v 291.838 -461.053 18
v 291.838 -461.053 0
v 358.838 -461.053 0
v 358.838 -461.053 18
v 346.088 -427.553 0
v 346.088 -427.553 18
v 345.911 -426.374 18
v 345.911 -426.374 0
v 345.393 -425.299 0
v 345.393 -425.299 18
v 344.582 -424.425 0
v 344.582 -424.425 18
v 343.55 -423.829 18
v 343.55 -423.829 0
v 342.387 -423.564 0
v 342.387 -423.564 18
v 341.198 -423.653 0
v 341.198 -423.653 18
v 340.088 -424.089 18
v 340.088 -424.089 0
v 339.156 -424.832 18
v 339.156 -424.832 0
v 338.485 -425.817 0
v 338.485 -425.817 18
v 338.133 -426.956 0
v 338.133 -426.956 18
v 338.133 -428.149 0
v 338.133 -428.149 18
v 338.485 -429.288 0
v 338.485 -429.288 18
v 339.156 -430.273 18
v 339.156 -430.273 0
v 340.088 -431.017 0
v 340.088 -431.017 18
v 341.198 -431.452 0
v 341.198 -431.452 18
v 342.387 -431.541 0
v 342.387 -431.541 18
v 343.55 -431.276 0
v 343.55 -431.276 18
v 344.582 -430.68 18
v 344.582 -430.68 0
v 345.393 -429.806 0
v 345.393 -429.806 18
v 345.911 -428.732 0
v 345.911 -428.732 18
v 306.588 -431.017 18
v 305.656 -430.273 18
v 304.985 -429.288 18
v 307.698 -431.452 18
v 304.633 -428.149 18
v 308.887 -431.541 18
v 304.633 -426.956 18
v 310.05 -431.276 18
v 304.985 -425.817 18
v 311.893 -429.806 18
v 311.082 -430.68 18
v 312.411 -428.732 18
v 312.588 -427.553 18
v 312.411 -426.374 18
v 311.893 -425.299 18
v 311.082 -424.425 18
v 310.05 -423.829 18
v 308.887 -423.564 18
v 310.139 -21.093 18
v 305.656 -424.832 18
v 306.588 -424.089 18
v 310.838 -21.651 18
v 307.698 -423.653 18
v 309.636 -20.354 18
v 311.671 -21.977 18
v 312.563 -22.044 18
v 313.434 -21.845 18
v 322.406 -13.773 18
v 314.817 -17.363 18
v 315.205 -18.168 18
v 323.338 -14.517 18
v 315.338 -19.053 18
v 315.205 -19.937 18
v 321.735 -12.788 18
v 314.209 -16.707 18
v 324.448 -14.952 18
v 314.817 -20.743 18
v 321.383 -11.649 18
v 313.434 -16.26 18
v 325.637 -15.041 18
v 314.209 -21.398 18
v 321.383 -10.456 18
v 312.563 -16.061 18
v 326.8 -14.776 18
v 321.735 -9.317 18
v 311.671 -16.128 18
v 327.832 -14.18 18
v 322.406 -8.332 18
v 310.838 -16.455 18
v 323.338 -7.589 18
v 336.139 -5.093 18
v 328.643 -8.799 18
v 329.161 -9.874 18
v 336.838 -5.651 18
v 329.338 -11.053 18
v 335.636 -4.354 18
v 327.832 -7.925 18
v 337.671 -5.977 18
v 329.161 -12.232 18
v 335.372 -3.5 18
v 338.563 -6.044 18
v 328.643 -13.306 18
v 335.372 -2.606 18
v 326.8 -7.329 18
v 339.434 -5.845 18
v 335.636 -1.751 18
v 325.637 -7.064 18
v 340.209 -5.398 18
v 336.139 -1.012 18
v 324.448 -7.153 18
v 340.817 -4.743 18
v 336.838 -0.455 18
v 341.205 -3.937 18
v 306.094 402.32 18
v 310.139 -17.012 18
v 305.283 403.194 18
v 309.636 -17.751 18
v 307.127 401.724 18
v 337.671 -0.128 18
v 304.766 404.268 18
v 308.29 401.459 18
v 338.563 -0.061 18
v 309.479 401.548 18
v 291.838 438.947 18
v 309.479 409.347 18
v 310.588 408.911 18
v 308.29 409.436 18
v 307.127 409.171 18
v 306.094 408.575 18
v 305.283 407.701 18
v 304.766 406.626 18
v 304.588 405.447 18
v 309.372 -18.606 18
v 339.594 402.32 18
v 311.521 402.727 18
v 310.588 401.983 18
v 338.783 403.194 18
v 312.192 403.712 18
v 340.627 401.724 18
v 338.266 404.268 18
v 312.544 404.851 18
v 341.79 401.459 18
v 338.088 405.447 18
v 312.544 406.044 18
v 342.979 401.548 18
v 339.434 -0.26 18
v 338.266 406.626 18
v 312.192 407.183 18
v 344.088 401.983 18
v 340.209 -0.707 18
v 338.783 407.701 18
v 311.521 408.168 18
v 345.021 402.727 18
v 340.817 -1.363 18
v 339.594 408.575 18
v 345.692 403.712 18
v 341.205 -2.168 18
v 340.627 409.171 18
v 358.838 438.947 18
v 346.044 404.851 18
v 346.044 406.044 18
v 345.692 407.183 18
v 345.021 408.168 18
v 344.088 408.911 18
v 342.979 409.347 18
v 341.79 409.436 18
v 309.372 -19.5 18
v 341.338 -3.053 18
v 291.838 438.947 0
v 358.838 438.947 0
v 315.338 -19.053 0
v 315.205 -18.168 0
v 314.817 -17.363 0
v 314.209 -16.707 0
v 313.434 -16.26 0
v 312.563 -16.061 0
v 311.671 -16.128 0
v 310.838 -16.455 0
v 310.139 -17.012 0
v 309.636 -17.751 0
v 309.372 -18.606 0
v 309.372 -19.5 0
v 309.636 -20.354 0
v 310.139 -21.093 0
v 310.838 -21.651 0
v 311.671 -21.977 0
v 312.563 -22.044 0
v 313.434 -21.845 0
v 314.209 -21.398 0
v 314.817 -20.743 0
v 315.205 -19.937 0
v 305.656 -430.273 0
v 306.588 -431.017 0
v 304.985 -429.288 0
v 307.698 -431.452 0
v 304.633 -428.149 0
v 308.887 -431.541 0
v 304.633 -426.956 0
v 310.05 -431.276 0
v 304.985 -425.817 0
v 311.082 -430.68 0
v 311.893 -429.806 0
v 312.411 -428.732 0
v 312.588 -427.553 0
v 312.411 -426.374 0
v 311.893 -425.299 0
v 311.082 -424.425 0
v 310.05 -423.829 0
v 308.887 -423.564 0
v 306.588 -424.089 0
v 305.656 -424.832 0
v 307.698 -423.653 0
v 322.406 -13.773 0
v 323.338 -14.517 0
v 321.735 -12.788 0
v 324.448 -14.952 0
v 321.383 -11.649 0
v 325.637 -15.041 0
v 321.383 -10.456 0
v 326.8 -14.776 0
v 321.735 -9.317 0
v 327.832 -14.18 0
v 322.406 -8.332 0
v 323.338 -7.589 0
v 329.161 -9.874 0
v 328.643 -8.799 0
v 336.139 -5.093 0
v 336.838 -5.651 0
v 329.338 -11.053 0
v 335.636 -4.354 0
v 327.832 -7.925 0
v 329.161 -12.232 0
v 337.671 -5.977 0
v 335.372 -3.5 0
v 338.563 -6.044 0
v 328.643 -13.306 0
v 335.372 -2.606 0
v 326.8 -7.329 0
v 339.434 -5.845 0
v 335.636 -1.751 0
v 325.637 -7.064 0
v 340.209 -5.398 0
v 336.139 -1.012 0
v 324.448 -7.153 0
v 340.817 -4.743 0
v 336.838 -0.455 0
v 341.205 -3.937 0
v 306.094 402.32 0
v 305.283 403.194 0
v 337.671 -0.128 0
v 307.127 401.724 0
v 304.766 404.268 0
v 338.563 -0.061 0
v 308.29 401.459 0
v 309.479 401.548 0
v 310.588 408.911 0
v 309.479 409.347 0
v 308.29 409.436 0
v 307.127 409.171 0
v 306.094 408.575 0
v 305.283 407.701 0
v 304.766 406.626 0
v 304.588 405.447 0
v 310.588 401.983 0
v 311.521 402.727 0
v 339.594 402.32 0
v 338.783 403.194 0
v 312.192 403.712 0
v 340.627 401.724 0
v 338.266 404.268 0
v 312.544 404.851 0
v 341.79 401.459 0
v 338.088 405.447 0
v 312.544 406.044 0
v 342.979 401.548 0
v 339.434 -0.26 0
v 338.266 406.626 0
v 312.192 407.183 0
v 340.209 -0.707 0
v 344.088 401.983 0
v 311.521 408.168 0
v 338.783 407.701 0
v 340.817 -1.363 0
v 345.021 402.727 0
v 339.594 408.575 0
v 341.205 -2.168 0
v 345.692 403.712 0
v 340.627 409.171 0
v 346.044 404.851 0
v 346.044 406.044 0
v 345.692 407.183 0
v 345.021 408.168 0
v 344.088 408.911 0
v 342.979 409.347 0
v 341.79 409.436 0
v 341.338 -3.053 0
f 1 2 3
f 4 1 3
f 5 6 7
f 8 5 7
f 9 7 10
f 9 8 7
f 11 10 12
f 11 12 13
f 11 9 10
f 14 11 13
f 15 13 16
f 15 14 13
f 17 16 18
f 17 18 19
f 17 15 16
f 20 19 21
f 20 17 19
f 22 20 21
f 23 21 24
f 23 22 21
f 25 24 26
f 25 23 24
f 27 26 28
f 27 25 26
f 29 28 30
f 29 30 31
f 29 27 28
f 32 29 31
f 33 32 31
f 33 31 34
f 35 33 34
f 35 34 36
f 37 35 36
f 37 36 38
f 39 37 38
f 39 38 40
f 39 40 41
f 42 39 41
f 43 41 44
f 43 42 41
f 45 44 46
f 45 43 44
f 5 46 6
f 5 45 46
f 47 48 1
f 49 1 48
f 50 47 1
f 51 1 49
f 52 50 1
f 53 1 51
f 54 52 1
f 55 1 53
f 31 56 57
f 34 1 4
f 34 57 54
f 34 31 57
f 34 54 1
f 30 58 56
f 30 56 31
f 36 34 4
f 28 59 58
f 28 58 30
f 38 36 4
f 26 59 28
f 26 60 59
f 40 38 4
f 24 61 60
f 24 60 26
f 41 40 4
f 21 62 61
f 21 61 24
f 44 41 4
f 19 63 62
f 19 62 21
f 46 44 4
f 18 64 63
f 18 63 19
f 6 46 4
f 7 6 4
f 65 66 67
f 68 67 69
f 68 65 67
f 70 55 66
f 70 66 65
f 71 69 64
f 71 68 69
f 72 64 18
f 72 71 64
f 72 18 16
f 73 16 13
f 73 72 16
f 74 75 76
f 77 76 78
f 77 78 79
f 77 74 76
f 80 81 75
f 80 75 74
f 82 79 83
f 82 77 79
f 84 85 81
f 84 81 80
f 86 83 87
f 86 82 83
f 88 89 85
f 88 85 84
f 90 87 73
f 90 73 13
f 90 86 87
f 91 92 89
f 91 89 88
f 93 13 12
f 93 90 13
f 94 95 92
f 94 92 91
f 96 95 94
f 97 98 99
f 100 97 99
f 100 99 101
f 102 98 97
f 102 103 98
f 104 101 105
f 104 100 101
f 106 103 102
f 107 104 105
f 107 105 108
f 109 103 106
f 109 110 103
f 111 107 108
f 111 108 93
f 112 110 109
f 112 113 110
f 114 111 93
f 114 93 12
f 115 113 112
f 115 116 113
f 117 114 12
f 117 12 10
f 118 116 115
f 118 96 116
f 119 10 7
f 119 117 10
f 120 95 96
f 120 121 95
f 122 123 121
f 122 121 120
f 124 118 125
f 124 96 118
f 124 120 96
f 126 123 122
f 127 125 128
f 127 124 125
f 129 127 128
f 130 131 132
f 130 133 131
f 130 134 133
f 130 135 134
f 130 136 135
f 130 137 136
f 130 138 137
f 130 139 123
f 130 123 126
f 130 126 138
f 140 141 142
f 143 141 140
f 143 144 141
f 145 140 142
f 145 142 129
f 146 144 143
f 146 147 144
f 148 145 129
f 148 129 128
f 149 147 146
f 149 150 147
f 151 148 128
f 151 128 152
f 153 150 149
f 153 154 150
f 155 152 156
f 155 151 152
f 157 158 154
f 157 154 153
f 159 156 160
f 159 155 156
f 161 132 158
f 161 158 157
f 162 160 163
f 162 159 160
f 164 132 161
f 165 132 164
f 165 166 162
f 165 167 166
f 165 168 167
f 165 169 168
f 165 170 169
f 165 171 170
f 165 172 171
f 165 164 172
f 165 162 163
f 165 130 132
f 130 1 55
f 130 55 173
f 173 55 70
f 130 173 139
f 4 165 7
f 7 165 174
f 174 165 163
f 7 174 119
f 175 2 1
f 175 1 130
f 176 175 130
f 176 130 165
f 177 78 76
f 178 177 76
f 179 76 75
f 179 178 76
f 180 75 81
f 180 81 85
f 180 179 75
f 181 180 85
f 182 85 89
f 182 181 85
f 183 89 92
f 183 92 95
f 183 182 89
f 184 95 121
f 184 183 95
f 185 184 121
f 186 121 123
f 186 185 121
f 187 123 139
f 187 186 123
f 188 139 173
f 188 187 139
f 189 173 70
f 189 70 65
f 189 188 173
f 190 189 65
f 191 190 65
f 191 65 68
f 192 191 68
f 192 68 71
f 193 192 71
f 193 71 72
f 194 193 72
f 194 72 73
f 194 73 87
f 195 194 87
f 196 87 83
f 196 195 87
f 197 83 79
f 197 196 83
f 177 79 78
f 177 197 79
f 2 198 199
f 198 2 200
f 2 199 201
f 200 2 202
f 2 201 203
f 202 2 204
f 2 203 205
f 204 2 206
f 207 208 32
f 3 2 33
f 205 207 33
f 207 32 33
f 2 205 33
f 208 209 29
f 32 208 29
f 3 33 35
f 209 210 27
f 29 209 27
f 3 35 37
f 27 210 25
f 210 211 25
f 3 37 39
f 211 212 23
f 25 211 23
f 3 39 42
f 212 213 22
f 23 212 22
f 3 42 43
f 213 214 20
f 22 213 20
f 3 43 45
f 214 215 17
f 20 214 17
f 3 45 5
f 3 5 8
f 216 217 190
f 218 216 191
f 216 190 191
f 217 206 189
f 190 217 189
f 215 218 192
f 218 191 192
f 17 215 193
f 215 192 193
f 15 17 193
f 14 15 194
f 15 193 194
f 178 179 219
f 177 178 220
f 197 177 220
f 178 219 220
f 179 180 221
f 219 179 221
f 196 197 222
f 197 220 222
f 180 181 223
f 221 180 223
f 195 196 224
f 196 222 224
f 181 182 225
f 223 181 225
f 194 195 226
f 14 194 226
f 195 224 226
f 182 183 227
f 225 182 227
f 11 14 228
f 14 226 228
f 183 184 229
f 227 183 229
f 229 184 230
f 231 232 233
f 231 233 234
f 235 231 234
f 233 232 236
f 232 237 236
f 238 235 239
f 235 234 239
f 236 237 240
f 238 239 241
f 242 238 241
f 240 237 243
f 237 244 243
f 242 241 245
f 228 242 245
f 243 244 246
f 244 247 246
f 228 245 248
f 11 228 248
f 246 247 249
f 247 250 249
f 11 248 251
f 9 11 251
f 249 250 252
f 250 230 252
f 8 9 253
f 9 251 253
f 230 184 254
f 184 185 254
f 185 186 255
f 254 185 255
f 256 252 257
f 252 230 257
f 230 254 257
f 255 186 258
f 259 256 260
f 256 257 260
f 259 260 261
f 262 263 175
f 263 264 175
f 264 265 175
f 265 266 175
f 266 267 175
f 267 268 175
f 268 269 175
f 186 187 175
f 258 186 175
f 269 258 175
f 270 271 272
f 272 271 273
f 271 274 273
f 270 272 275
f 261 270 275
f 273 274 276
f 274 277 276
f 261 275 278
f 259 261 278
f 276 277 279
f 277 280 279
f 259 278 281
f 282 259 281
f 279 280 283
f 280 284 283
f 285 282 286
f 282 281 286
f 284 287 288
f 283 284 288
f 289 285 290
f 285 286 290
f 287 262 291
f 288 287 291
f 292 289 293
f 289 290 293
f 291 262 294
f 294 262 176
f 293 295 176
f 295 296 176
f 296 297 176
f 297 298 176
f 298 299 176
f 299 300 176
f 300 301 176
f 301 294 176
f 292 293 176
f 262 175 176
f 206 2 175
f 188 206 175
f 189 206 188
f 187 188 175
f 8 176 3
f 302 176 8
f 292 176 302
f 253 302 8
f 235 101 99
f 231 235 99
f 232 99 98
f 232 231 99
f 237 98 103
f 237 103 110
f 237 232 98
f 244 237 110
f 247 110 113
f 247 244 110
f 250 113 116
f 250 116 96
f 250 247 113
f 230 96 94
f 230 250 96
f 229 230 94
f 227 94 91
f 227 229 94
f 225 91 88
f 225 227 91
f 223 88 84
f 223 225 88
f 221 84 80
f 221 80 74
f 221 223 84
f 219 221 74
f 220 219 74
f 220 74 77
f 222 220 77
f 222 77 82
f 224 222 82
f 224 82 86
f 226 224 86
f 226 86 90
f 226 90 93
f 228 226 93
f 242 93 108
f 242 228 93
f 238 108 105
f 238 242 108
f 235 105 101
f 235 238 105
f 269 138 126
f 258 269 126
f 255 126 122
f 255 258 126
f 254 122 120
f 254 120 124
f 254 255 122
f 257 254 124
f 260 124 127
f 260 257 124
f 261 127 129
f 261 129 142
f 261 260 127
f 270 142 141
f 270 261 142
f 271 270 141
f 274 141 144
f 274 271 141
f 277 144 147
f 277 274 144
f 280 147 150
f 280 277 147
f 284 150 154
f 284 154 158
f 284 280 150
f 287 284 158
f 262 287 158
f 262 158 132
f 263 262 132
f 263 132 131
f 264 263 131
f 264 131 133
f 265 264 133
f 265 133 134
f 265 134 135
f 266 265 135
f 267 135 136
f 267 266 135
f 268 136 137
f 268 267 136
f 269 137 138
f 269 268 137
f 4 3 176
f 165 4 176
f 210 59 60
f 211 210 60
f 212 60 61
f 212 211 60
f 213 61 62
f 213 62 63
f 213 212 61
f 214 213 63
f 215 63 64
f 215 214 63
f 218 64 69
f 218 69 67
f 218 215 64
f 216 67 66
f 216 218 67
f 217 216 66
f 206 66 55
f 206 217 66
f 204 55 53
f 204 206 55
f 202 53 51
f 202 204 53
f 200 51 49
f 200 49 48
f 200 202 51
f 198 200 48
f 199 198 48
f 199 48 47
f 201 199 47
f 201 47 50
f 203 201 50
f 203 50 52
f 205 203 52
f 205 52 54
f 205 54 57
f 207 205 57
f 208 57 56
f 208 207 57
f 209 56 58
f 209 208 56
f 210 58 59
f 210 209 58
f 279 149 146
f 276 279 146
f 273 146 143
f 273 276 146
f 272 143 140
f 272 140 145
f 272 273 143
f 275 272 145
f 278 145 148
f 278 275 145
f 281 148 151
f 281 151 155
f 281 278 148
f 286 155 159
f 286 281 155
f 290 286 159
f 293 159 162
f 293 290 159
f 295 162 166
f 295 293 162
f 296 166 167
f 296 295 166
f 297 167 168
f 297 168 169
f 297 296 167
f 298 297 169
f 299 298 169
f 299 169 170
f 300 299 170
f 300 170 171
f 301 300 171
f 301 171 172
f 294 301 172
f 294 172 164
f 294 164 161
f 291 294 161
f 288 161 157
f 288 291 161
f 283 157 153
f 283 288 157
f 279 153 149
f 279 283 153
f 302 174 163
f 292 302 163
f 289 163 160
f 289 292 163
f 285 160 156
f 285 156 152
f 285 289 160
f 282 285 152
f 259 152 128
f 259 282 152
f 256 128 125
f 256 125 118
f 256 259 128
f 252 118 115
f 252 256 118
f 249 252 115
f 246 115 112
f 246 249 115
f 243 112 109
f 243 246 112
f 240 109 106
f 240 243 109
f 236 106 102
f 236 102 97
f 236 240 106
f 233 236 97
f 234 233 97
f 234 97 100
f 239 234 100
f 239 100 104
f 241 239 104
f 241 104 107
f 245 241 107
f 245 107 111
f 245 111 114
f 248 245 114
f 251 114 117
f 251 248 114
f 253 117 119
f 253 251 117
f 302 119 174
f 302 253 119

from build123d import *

# Parameters (mm, degrees)
WOODBASE_W          = 67
WOODBASE_H          = 900
WOODBASE_R          = 4
WOODBASE_R_2        = 3
BOSS_EXTRUDE1_DEPTH = 18


with BuildPart() as part:
    # woodbase → Boss-Extrude1 (new body)
    with BuildSketch(Plane.XY):
        with Locations((325.338433817, -11.052631579)):
            Rectangle(WOODBASE_W, WOODBASE_H)
        with Locations((325.338433817, -11.052631579)):
            Circle(WOODBASE_R, mode=Mode.SUBTRACT)
        with Locations((312.338433817, -19.052631579)):
            Circle(WOODBASE_R_2, mode=Mode.SUBTRACT)
        with Locations((338.338433817, -3.052631579)):
            Circle(WOODBASE_R_2, mode=Mode.SUBTRACT)
        with Locations((308.588433817, -427.552631579)):
            Circle(WOODBASE_R, mode=Mode.SUBTRACT)
        with Locations((342.088433817, -427.552631579)):
            Circle(WOODBASE_R, mode=Mode.SUBTRACT)
        with Locations(Location((342.088433817, 405.447368421, 0), (0, 0, 180))):
            Circle(WOODBASE_R, mode=Mode.SUBTRACT)
        with Locations(Location((308.588433817, 405.447368421, 0), (0, 0, 180))):
            Circle(WOODBASE_R, mode=Mode.SUBTRACT)
    extrude(amount=BOSS_EXTRUDE1_DEPTH)


solid = part.part
